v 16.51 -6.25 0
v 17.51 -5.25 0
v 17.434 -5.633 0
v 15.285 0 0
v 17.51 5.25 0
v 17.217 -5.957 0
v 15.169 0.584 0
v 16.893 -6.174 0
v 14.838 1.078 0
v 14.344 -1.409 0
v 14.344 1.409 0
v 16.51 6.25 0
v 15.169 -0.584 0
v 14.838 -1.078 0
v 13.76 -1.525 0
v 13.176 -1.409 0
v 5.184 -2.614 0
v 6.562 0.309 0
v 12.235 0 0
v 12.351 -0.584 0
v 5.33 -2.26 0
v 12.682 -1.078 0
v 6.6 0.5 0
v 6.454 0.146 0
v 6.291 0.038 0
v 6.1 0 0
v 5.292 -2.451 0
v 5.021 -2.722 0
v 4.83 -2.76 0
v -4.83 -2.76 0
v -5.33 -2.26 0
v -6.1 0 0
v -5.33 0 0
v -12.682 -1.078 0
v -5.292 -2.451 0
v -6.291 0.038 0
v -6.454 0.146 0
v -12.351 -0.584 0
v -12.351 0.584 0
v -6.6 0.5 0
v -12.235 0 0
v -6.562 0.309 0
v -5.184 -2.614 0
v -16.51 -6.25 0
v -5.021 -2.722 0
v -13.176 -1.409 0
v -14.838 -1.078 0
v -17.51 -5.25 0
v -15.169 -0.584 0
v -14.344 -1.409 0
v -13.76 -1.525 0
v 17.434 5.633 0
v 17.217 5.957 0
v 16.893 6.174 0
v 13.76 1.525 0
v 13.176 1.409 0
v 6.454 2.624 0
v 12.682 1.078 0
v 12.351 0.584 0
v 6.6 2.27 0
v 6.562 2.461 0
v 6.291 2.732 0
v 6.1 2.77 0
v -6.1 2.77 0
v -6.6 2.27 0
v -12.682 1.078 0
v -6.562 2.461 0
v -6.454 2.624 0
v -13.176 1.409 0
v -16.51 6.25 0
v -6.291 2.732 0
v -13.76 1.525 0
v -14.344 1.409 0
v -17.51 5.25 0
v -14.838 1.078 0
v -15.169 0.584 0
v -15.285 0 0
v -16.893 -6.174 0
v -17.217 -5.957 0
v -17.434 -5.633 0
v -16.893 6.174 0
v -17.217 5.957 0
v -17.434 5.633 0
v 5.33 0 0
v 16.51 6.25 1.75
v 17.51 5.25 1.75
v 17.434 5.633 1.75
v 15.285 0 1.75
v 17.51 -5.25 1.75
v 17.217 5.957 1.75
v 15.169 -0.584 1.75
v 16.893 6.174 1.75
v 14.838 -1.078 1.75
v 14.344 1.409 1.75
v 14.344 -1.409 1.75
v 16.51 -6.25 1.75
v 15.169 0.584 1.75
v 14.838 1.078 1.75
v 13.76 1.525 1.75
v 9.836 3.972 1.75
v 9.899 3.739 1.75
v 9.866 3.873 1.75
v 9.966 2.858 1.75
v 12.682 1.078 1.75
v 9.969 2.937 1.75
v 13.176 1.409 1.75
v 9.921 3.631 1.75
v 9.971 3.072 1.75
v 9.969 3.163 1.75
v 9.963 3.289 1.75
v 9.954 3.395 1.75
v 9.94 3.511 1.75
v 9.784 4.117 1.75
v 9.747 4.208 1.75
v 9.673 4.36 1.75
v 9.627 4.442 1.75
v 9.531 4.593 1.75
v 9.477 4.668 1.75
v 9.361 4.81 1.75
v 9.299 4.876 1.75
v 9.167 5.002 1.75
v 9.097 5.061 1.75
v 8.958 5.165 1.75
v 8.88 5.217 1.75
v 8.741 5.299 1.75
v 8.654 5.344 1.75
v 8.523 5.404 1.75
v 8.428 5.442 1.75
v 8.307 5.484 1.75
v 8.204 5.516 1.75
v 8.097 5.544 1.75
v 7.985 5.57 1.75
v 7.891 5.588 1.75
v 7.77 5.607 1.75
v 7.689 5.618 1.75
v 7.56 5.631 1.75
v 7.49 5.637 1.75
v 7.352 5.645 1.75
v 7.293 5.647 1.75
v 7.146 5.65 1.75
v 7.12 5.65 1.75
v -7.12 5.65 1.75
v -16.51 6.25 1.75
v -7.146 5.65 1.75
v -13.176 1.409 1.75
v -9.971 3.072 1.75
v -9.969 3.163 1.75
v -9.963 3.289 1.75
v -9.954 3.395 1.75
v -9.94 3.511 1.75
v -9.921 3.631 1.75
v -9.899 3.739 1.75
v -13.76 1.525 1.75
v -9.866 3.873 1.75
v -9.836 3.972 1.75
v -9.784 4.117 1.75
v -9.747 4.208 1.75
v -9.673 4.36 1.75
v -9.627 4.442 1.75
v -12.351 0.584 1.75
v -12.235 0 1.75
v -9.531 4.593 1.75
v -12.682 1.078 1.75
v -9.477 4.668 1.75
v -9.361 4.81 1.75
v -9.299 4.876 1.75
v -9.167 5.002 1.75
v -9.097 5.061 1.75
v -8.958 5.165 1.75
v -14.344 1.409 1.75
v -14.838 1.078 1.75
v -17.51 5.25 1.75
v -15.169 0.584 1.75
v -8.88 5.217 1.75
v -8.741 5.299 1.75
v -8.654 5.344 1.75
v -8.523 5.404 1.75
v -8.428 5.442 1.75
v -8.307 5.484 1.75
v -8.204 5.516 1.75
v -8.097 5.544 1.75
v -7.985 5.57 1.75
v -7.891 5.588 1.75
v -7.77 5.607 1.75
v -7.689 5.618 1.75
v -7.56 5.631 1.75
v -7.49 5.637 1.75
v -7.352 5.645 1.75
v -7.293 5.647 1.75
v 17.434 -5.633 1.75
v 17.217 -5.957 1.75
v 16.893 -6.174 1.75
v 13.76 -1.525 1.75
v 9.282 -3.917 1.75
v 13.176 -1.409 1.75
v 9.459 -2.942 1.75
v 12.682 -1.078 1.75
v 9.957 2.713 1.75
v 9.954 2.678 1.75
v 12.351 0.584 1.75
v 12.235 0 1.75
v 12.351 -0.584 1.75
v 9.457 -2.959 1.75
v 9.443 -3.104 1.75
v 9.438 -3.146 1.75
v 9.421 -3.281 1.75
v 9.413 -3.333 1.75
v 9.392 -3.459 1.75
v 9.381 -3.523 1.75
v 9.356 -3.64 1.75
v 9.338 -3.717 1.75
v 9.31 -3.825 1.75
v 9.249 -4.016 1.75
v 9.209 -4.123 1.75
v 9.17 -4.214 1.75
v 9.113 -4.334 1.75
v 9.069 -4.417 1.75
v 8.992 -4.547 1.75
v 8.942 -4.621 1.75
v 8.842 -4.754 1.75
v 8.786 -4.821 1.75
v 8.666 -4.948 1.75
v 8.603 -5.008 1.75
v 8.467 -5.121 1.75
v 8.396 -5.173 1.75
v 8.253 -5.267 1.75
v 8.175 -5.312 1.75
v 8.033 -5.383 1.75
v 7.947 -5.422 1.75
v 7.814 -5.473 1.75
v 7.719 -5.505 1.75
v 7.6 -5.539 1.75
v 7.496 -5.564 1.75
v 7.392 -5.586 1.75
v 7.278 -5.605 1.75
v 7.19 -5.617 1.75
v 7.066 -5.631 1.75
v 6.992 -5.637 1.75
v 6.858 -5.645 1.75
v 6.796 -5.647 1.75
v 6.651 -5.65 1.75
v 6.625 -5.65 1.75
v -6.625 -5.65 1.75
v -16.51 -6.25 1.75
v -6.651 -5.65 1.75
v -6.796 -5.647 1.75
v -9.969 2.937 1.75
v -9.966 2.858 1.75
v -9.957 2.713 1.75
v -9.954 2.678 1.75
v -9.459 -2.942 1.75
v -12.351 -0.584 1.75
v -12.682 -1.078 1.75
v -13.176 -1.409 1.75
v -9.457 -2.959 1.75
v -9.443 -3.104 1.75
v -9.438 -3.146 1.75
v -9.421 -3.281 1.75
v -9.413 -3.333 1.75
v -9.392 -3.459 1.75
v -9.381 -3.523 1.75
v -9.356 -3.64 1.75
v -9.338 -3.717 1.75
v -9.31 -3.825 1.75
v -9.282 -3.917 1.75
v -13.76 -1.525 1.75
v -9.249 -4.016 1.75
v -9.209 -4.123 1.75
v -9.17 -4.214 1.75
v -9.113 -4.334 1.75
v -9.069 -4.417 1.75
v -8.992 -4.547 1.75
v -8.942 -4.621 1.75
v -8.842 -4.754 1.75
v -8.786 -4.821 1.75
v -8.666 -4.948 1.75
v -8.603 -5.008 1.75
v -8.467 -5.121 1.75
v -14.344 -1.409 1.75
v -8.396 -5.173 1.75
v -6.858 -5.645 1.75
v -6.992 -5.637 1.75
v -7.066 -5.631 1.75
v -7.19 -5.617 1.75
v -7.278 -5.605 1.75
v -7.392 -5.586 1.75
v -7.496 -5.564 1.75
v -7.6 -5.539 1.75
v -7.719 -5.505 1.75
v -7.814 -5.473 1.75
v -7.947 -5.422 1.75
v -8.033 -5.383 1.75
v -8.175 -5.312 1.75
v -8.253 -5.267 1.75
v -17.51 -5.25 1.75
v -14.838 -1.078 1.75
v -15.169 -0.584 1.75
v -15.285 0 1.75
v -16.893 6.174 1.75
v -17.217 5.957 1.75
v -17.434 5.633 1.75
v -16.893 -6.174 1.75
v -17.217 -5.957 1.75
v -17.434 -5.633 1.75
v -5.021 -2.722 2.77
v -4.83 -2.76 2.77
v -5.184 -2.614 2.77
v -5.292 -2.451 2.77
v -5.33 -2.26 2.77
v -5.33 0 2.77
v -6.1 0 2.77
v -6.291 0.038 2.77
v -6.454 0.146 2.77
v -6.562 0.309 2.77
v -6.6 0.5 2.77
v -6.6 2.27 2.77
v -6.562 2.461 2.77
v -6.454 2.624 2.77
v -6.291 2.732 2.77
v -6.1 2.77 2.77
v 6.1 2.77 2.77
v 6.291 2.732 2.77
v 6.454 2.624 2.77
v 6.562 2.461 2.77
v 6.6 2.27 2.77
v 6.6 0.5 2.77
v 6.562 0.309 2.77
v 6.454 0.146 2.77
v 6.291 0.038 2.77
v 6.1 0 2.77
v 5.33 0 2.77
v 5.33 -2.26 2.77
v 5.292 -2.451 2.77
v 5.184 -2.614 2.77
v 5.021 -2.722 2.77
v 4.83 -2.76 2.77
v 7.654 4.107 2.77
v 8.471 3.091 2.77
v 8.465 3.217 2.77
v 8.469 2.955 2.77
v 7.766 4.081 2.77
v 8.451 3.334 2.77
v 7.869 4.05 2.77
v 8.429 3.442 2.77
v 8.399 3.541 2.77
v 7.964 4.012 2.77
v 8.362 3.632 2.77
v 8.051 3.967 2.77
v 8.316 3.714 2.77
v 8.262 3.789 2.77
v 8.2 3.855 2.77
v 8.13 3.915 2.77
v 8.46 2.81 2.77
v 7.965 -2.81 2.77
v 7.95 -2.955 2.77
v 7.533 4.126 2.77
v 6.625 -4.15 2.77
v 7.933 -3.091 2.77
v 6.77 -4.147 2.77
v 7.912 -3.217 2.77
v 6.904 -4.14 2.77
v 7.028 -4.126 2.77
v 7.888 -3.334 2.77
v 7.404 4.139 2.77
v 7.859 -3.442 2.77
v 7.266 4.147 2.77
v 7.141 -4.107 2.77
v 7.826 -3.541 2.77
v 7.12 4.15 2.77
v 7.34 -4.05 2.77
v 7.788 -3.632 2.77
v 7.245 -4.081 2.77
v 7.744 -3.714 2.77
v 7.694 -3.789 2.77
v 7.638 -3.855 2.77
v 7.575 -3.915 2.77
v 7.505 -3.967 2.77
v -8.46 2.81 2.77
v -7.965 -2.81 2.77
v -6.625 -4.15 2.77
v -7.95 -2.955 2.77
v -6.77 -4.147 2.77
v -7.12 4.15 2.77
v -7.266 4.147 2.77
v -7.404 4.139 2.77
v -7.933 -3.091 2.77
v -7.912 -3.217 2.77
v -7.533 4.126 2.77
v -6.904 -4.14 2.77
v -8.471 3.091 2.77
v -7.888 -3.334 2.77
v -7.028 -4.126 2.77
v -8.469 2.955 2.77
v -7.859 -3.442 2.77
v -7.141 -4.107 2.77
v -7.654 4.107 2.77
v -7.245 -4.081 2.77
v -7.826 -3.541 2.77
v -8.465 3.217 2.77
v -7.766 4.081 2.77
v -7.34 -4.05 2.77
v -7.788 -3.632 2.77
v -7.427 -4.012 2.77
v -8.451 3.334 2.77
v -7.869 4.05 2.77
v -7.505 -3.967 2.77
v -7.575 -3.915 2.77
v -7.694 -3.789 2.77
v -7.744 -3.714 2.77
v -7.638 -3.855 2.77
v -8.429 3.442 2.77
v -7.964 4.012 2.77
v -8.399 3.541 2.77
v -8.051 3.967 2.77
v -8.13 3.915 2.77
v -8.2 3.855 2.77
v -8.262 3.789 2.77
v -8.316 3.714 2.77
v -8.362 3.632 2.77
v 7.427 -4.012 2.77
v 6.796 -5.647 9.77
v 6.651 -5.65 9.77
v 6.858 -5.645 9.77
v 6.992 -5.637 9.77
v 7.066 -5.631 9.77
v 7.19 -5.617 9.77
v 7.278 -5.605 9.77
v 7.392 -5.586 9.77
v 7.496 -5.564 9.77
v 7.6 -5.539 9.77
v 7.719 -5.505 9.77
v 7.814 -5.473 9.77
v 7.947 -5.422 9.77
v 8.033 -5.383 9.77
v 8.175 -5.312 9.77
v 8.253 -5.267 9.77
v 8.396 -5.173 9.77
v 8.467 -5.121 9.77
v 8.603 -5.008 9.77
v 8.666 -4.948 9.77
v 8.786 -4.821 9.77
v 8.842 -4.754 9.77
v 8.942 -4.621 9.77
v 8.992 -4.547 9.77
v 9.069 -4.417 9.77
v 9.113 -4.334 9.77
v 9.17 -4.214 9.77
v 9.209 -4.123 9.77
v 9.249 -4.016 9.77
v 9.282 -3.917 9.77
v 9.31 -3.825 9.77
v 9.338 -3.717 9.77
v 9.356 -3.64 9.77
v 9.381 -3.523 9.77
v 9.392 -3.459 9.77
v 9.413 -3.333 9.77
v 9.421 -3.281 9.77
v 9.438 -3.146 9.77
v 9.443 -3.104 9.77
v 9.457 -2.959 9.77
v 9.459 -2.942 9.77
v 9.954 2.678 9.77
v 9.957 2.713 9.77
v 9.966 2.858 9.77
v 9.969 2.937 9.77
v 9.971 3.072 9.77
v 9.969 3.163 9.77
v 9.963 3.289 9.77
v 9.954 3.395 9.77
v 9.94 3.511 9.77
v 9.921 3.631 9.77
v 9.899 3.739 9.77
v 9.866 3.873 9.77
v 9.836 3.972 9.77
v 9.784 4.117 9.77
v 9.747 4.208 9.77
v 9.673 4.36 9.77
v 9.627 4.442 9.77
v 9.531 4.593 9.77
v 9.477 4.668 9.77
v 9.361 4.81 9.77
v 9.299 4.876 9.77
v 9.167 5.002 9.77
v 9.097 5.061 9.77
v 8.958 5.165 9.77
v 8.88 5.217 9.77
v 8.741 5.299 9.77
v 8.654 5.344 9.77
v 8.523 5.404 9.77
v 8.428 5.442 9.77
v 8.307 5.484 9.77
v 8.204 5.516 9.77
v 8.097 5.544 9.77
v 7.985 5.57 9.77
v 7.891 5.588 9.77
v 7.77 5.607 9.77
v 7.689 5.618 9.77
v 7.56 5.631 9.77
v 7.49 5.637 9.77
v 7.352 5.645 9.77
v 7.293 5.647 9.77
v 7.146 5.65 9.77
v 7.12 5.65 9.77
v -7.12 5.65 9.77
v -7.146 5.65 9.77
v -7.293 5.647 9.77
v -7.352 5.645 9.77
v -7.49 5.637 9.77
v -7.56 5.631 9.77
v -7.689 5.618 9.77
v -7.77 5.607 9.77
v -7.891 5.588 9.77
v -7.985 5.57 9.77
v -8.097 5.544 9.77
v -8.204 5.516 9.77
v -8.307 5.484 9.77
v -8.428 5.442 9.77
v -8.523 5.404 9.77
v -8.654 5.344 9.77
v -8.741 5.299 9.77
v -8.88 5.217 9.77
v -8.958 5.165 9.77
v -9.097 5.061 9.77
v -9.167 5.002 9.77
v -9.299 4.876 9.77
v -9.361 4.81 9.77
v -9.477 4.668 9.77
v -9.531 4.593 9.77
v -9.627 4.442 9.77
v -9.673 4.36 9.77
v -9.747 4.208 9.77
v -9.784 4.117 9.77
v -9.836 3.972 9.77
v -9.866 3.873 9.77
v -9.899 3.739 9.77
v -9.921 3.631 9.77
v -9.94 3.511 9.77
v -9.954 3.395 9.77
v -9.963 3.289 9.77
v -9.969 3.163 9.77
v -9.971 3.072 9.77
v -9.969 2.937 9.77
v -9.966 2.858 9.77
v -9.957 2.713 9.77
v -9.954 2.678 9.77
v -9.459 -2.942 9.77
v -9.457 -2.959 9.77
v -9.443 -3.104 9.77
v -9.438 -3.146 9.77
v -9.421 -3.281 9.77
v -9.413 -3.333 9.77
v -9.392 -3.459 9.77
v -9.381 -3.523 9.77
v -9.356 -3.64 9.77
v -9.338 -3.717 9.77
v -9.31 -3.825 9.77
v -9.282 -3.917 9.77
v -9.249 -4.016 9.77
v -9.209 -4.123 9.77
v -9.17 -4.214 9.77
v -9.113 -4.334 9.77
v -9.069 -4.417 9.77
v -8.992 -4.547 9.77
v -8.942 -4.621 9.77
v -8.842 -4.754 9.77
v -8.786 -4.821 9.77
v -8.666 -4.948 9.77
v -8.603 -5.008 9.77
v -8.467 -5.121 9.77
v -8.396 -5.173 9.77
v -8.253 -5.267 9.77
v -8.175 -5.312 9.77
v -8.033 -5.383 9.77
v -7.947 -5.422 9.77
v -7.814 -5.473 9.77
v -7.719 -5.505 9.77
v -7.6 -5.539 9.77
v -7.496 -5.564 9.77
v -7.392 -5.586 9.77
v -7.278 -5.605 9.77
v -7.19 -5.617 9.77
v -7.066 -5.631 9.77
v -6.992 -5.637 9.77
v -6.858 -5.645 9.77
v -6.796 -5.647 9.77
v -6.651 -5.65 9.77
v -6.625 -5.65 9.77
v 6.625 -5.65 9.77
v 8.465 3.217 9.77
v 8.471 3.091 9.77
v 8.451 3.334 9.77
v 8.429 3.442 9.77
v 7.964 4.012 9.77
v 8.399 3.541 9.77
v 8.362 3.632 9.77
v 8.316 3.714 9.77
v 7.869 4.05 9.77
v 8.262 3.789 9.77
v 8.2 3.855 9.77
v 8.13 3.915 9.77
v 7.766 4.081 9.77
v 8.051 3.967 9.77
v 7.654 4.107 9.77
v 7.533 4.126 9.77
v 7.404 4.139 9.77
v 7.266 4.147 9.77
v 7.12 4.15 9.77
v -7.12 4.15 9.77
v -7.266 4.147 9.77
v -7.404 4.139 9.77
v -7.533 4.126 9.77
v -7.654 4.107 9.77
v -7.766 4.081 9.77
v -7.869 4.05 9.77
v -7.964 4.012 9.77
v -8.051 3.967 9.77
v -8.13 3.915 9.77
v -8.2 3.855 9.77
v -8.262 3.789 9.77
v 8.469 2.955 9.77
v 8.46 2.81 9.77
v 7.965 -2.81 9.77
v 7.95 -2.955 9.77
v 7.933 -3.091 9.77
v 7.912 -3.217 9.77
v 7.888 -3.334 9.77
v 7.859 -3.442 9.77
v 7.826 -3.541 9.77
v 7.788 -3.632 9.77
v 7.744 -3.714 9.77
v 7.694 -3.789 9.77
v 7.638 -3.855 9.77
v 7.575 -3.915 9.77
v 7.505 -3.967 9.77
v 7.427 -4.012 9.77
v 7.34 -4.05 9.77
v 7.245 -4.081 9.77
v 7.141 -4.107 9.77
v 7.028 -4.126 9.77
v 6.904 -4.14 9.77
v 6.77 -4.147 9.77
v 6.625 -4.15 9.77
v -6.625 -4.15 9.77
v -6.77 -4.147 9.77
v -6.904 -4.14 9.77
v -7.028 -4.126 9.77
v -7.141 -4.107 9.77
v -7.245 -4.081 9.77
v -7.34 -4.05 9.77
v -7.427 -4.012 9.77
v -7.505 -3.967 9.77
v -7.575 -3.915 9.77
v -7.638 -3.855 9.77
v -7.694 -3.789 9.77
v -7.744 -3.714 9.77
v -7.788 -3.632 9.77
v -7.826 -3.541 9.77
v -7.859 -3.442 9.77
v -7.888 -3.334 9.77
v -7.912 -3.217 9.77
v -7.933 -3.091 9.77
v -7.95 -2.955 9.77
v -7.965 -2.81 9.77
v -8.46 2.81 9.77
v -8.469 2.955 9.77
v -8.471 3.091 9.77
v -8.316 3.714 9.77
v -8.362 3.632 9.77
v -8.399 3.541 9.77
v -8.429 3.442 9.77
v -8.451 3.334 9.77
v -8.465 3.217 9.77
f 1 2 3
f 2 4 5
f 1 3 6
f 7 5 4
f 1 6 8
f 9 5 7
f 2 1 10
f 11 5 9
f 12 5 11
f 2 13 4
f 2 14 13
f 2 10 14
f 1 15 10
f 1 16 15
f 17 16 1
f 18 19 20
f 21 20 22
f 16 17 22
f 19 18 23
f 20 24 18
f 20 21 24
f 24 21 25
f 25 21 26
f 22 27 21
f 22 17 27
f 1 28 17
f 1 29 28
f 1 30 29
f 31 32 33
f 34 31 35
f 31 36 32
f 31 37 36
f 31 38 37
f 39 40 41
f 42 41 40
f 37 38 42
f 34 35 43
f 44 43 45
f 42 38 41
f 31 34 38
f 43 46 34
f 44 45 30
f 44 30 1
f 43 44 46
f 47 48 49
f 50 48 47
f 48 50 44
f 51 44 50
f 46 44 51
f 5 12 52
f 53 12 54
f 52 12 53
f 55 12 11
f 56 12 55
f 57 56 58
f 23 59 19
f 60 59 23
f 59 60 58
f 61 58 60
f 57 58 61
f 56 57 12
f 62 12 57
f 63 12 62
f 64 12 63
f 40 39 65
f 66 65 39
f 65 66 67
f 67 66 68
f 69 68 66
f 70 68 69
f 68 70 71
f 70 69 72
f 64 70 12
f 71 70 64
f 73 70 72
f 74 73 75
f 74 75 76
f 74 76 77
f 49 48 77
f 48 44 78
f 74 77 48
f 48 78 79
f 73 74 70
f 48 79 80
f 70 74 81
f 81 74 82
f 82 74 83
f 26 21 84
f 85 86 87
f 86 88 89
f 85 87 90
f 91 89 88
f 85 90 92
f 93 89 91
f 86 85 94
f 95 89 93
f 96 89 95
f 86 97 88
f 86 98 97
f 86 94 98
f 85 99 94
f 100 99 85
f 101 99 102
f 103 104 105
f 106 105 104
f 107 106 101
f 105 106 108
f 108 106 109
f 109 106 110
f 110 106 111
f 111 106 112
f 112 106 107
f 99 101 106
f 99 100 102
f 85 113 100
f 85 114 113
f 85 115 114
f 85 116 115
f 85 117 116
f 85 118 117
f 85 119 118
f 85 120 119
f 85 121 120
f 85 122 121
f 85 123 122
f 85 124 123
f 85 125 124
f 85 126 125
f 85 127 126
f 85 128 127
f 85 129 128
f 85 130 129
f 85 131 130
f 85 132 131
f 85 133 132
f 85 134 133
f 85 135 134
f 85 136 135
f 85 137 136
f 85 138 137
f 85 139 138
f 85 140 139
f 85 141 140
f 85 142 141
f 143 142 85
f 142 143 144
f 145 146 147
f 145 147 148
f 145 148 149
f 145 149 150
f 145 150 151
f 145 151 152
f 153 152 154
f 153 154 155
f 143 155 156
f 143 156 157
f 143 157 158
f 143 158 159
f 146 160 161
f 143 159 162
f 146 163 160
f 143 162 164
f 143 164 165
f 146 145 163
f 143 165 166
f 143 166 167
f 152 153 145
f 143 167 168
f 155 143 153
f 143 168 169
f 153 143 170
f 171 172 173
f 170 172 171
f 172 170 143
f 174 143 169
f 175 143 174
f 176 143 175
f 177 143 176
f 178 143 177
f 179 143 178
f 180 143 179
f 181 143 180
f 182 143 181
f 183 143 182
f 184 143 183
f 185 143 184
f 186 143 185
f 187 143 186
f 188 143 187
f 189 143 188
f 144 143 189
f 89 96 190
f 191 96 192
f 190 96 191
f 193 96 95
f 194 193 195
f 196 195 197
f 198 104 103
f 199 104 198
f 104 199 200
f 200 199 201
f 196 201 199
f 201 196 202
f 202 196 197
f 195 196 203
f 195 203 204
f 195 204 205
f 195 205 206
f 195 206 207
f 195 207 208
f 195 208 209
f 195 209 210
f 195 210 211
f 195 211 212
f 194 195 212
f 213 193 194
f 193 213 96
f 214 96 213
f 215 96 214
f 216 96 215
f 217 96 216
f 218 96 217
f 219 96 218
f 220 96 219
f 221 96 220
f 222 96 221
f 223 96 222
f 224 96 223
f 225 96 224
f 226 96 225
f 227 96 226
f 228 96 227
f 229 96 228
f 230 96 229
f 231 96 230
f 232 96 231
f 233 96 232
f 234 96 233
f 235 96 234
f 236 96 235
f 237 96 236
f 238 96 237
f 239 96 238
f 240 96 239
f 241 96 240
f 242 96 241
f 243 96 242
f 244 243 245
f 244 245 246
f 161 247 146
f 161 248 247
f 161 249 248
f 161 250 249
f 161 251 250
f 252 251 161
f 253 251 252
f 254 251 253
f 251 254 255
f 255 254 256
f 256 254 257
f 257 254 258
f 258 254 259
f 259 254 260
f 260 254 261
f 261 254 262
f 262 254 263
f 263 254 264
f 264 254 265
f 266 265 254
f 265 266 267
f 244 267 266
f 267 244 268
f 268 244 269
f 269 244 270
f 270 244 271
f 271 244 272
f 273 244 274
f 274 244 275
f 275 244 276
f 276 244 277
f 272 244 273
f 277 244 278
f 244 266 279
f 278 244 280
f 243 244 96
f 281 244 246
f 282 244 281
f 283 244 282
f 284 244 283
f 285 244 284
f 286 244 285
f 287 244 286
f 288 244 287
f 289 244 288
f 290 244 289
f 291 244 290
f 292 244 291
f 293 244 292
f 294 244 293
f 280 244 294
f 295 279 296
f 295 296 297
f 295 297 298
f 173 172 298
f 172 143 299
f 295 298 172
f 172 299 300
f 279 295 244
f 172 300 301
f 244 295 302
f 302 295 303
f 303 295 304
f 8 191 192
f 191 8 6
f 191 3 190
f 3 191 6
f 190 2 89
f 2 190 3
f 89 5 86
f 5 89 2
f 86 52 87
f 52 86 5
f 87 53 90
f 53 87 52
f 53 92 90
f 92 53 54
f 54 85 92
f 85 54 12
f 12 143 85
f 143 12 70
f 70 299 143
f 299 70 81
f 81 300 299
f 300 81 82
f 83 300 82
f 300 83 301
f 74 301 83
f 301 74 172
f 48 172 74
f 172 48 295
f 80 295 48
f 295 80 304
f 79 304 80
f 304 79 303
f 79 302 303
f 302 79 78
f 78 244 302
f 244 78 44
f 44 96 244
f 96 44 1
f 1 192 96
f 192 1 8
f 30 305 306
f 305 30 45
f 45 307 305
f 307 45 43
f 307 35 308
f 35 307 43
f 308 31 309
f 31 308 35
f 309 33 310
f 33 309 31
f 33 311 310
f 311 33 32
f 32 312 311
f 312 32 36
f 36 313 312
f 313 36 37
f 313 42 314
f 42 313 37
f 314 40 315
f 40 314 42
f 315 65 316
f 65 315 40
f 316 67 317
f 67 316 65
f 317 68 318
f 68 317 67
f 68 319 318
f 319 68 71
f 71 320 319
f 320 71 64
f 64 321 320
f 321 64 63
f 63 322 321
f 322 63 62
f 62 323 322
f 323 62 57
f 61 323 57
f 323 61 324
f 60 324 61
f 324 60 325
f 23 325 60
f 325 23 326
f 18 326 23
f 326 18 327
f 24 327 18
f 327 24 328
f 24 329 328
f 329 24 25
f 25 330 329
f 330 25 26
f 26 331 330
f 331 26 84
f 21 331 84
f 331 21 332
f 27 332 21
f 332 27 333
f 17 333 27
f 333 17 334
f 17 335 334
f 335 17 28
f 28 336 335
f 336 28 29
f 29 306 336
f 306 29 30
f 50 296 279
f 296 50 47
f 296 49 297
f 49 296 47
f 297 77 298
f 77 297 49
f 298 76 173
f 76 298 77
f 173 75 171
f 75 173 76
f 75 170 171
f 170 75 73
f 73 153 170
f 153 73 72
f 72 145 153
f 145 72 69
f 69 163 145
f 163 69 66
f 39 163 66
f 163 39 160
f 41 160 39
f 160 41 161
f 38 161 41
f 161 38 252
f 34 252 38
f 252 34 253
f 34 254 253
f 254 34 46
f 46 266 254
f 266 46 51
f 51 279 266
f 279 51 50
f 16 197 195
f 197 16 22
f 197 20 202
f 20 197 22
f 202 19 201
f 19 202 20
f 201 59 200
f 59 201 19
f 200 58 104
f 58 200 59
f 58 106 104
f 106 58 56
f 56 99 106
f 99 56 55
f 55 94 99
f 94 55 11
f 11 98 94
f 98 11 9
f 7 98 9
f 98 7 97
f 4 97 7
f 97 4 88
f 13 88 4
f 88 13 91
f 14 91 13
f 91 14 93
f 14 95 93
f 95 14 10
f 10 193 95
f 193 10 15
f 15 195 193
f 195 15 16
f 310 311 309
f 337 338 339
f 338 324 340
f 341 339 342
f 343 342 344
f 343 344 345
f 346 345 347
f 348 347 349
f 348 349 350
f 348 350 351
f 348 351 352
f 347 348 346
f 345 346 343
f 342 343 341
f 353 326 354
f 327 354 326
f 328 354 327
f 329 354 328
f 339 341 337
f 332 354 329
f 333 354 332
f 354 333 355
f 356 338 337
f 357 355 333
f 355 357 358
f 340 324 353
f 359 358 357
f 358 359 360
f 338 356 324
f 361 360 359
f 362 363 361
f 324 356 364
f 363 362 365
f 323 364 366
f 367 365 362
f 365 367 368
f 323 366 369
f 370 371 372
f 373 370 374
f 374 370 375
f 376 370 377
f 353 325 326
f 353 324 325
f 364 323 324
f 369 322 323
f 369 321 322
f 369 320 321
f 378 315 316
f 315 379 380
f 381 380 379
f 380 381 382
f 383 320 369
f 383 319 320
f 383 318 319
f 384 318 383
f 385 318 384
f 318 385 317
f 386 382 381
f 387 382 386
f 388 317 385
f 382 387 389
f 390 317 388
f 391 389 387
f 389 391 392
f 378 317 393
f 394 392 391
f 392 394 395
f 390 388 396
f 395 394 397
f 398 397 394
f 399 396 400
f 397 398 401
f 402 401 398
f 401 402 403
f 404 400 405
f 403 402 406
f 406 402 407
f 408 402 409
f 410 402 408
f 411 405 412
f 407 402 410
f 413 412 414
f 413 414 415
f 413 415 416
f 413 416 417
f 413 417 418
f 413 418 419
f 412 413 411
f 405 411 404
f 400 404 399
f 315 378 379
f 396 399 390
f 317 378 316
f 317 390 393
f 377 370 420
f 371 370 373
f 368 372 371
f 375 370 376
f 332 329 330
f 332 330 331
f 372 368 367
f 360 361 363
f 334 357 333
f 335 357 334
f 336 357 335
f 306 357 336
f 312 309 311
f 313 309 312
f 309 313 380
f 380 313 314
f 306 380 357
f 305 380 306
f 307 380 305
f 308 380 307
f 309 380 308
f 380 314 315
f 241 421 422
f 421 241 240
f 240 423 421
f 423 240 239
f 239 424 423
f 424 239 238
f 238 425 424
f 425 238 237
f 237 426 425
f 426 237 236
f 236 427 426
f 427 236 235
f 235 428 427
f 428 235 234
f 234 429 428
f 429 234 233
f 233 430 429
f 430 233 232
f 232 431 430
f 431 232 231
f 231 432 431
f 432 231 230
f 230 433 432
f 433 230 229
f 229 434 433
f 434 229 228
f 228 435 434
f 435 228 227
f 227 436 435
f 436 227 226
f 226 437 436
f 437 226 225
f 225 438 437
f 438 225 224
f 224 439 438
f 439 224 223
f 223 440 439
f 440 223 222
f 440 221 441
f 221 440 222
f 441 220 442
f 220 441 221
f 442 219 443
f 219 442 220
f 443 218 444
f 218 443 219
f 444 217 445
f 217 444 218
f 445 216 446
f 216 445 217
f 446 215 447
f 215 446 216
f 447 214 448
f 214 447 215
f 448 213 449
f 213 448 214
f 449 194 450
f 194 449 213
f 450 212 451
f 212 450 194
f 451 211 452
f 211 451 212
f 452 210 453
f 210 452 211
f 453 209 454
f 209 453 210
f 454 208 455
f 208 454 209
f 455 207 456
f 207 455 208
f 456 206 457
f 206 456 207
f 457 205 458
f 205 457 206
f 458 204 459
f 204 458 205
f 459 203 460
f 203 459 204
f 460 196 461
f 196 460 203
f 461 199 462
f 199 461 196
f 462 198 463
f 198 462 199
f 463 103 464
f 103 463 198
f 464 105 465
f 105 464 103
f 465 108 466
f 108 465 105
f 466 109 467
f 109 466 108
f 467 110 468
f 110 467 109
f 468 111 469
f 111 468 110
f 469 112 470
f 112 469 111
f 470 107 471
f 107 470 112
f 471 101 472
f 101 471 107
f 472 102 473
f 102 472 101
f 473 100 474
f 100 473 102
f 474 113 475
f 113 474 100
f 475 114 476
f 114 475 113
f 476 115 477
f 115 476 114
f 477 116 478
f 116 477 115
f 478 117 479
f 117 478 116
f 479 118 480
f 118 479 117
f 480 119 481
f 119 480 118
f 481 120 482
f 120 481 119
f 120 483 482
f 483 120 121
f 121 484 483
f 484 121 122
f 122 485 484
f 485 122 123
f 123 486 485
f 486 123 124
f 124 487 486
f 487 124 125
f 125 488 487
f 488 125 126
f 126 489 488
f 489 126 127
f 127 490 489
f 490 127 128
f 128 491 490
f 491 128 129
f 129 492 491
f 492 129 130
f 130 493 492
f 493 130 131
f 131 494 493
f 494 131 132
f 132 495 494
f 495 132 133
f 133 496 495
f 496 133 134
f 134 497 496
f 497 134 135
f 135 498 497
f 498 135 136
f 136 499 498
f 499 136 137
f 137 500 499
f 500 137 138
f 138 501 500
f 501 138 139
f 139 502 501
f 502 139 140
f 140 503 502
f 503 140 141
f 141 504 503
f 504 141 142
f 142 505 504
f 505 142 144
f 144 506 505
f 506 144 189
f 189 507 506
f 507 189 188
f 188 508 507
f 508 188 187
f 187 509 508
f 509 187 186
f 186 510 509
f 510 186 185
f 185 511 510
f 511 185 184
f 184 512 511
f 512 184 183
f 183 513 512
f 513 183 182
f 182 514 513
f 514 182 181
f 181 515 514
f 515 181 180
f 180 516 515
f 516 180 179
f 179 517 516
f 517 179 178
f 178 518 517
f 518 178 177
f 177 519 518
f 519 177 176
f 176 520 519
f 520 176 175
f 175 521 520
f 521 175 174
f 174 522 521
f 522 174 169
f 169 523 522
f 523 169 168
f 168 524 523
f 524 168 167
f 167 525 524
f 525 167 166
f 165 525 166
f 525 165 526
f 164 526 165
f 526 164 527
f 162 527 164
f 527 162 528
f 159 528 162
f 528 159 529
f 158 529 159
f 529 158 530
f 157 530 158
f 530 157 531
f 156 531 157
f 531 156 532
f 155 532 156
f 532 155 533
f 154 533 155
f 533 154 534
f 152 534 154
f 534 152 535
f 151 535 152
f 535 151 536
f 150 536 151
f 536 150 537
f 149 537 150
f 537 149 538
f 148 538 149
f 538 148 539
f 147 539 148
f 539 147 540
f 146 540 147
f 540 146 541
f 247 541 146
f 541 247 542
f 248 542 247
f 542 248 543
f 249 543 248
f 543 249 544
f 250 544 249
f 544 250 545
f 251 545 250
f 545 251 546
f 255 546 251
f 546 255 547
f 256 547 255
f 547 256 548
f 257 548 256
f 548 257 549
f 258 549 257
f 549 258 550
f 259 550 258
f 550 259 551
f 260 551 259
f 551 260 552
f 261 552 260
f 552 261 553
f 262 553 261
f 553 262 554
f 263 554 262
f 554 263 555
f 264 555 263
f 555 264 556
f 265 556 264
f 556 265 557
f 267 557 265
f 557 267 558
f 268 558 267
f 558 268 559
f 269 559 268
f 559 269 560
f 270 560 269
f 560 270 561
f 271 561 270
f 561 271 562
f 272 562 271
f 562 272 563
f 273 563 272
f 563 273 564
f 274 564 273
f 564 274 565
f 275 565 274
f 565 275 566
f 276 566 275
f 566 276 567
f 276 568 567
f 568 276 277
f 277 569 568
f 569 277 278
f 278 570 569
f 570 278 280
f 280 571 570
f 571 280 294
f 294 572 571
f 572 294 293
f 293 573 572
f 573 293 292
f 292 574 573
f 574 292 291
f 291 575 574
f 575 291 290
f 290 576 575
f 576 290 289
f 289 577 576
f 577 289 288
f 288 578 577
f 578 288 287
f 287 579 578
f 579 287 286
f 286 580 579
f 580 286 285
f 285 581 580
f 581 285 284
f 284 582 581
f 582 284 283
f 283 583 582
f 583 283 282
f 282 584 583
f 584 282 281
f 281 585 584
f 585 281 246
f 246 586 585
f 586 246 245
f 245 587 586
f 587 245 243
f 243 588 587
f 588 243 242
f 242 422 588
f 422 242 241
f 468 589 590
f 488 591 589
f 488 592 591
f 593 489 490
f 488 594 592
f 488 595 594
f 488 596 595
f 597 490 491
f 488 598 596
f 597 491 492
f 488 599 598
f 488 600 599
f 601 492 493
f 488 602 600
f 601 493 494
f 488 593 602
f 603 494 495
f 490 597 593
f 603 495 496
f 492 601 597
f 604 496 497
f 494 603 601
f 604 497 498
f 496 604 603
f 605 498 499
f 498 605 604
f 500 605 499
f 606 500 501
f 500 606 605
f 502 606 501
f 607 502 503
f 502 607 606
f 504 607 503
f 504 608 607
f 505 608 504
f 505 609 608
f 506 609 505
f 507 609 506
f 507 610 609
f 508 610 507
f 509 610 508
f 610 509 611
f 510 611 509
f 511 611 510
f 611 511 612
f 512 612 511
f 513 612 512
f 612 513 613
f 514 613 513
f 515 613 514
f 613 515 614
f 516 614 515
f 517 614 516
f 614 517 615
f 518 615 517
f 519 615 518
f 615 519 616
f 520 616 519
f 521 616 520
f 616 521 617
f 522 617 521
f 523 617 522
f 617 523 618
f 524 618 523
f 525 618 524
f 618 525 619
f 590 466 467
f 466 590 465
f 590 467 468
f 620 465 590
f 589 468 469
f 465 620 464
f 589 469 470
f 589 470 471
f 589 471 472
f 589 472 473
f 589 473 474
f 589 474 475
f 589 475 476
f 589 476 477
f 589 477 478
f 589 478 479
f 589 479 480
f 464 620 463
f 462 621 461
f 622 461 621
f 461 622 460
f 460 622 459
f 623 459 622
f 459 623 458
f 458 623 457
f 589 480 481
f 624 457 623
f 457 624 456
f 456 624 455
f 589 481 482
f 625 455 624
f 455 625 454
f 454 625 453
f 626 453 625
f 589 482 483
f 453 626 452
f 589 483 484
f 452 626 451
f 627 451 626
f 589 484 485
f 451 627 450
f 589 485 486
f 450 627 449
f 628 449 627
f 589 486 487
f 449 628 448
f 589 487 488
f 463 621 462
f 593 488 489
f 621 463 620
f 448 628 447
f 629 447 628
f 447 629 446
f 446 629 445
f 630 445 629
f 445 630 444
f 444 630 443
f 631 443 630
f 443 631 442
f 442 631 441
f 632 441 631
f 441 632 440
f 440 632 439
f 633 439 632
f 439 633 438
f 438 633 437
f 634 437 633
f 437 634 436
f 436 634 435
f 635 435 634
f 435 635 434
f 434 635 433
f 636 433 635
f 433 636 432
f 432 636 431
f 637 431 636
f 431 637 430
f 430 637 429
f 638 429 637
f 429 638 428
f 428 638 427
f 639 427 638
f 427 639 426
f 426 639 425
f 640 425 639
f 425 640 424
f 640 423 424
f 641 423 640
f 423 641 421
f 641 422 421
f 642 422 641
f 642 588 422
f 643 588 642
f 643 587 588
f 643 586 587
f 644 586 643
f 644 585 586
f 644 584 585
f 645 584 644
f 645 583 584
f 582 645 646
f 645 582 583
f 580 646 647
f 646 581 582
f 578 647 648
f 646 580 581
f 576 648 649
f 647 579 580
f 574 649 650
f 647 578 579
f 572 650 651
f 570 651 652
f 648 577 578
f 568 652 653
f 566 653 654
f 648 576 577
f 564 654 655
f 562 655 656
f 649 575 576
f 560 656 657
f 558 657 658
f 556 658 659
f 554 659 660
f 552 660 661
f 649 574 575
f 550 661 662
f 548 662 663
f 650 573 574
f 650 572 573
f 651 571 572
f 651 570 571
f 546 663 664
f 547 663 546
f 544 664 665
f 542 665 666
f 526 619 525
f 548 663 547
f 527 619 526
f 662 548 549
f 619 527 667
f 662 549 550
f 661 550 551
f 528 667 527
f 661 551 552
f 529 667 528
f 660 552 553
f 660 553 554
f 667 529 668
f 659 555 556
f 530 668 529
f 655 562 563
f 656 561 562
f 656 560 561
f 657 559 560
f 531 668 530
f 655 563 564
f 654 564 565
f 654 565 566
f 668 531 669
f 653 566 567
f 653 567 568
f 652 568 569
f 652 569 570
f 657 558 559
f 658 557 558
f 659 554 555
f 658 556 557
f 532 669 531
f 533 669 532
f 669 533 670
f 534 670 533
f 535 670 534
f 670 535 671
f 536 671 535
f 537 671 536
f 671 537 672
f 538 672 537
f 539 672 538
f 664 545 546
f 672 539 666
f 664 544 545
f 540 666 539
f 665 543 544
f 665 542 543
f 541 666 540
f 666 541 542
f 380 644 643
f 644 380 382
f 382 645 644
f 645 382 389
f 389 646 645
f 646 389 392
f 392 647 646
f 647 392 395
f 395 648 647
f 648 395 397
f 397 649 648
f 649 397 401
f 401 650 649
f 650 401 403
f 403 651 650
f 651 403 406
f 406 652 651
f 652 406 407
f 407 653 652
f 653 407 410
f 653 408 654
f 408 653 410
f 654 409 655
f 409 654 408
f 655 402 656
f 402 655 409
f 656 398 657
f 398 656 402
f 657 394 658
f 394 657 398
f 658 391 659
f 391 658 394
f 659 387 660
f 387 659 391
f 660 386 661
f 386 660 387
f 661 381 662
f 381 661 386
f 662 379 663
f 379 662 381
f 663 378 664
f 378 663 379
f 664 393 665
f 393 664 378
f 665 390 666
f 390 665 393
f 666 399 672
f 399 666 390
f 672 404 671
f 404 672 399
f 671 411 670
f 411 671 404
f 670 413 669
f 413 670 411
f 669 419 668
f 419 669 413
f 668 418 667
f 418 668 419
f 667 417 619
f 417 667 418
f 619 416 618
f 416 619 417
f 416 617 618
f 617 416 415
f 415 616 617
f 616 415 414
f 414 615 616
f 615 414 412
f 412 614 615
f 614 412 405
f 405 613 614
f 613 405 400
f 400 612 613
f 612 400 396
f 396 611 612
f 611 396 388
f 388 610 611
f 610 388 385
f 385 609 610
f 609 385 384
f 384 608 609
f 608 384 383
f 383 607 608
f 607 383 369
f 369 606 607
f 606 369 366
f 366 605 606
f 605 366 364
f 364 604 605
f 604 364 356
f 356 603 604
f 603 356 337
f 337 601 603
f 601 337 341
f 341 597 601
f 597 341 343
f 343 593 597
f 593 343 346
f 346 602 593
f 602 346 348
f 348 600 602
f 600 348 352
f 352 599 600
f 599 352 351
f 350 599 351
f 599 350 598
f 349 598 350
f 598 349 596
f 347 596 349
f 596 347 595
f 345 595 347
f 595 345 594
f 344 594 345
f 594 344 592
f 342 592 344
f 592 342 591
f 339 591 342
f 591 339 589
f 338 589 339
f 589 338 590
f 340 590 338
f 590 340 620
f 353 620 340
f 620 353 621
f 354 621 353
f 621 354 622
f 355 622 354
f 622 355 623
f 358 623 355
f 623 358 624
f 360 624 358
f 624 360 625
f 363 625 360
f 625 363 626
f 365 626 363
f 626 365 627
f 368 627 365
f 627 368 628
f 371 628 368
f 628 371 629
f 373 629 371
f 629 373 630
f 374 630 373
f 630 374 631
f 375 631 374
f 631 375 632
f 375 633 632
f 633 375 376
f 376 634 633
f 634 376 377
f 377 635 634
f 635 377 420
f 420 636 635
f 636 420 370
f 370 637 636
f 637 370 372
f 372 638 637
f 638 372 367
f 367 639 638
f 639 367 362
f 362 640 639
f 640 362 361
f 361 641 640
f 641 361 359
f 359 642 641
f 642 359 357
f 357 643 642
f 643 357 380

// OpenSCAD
pins = 9;
stripsTolerance = 0.25;
socketWall = 1.5;
socketDepth = 7;
mountThickness = 1.75;
// the jack is the female part that fits inside the socket
jackHeight = 8.3;
jackWidthIncrementBeyondNominalPinSpacing = 3.12;
// official value for db9 is 10.7, but that's not so good for our thicker plastic wall
mountHeight = 12.5;
// official value for db9 is 3.04, but I like 3.75
mountEdgeDistanceBeyondScrews = 3.75;
// official distance for db9 is 4.04, but I like 5.3
screwDistanceFromJack = 5.3;
socketScrewHole = 3.05;

slantAngle = 10;
offset = 1.34;
rounding = 0.75;
stripsHeight = 2.51;
// this is what it should be
nominalPinSpacing = 2.76;
// this is what it is if you use 0.1" header
headerPinSpacing = 2.54;
stripsSpacerDepth = 2.77;
// this might be useful to put down an extra layer of plastic at the bottom to help the header pins stick in place
stripsExtraDepth = 0;
pinHoleDiameter = 0.4;

module end_of_parameters_dummy() {}


//BEGIN: use <bezier.scad>;
/*
Copyright (c) 2017 Alexander R. Pruss.

Licensed under any Creative Commons Attribution license you like or under the
following MIT License.

Permission is hereby granted, free of charge, to any person obtaining a copy
of this software and associated documentation files (the "Software"), to deal
in the Software without restriction, including without limitation the rights
to use, copy, modify, merge, publish, distribute, sublicense, and/or sell
copies of the Software, and to permit persons to whom the Software is
furnished to do so, subject to the following conditions:

The above copyright notice and this permission notice shall be included in all
copies or substantial portions of the Software.

THE SOFTWARE IS PROVIDED "AS IS", WITHOUT WARRANTY OF ANY KIND, EXPRESS OR
IMPLIED, INCLUDING BUT NOT LIMITED TO THE WARRANTIES OF MERCHANTABILITY,
FITNESS FOR A PARTICULAR PURPOSE AND NONINFRINGEMENT. IN NO EVENT SHALL THE
AUTHORS OR COPYRIGHT HOLDERS BE LIABLE FOR ANY CLAIM, DAMAGES OR OTHER
LIABILITY, WHETHER IN AN ACTION OF CONTRACT, TORT OR OTHERWISE, ARISING FROM,
OUT OF OR IN CONNECTION WITH THE SOFTWARE OR THE USE OR OTHER DEALINGS IN THE
SOFTWARE.

*/


// Public domain Bezier stuff from www.thingiverse.com/thing:8443
function BEZ03(u) = pow(1-u, 3);
function BEZ13(u) = 3*u*pow(1-u,2);
function BEZ23(u) = 3*pow(u,2)*(1-u);
function BEZ33(u) = pow(u,3);
function PointAlongBez4(p0, p1, p2, p3, u) =
	BEZ03(u)*p0+BEZ13(u)*p1+BEZ23(u)*p2+BEZ33(u)*p3;
// End public domain Bezier stuff
function d2BEZ03(u) = 6*(1-u);
function d2BEZ13(u) = 18*u-12;
function d2BEZ23(u) = -18*u+6;
function d2BEZ33(u) = 6*u;

function worstCase2ndDerivative(p0, p1, p2, p3, u1, u2)
    = norm([
        for(i=[0:len(p0)-1])
            max([for(u=[u1,u2])
                d2BEZ03(u)*p0[i]+d2BEZ13(u)*p1[i]+
                d2BEZ23(u)*p2[i]+d2BEZ33(u)*p3[i]]) ]);

function neededIntervalLength(p0,p1,p2,p3,u1,u2,tolerance)
    = let(d2=worstCase2ndDerivative(p0,p1,p2,p3,u1,u2))
        d2==0 ? u2-u1+1 : sqrt(2*tolerance/d2);

function REPEAT_MIRRORED(v,angleStart=0,angleEnd=360) = ["m",v,angleStart,angleEnd];
function SMOOTH_REL(x) = ["r",x];
function SMOOTH_ABS(x) = ["a",x];
function SYMMETRIC() = ["r",1];
function OFFSET(v) = ["o",v];
function SHARP() = OFFSET([0,0,0]);
function LINE() = ["l",0];
function POLAR(r,angle) = OFFSET(r*[cos(angle),sin(angle)]);
//function POINT_IS_SPECIAL(v) = (v[0]=="r" || v[0]=="a" || v[0]=="o" || v[0]=="l");

// this does NOT handle offset type points; to handle those, use DecodeBezierOffsets()
function getControlPoint(cp,node,otherCP,otherNode,nextNode) =
    let(v=node-otherCP) (
    cp[0]=="r" ? node+cp[1]*v:
    cp[0]=="a" ? (
        norm(v)<1e-9 ? node+cp[1]*(node-otherNode)/norm(node-otherNode) : node+cp[1]*v/norm(v) ) :
        cp );

function onLine2(a,b,c,eps=1e-4) =
    norm(c-a) <= eps ? true
        : norm(b-a) <= eps ? false /* to be safe */
            : abs((c[1]-a[1])*(b[0]-a[0]) - (b[1]-a[1])*(c[0]-a[0])) <= eps * eps && norm(c-a) <= eps + norm(b-a);

function isStraight2(p1,c1,c2,p2,eps=1e-4) =
    len(p1) == 2 &&
    onLine2(p1,p2,c1,eps=eps) && onLine2(p2,p1,c2,eps=eps);

function Bezier2(p,index=0,precision=0.05,rightEndPoint=true,optimize=true) = let(nPoints=
        max(1, precision < 0 ?
                    ceil(1/
                        neededIntervalLength(p[index],p[index+1],p[index+2],p[index+3],0,1,-precision))
                    : ceil(1/precision)) )
    optimize && isStraight2(p[index],p[index+1],p[index+2],p[index+3]) ? (rightEndPoint?[p[index+0],p[index+3]]:[p[index+0]] ) :
    [for (i=[0:nPoints-(rightEndPoint?0:1)]) PointAlongBez4(p[index+0],p[index+1],p[index+2],p[index+3],i/nPoints)];

function flatten(listOfLists) = [ for(list = listOfLists) for(item = list) item ];


// p is a list of points, in the format:
// [node1,control1,control2,node2,control3, control4,node3, ...]
// You can replace inner control points with:
//   SYMMETRIC: uses a reflection of the control point on the other side of the node
//   SMOOTH_REL(x): like SYMMETRIC, but the distance of the control point to the node is x times the distance of the other control point to the node
//   SMOOTH_ABS(x): like SYMMETRIC, but the distance of the control point to the node is exactly x
// You can also replace any control point with:
//   OFFSET(v): puts the control point at the corresponding node plus the vector v
//   SHARP(): equivalent to OFFSET([0,0])
//   LINE(): when used for both control points between two nodes, generates a straight line
//   POLAR(r,angle): like OFFSET, except the offset is specified in polar coordinates

function DecodeBezierOffset(control,node) = control[0] == "o" ? node+control[1] : control;

function _mirrorMatrix(normalVector) = let(v = normalVector/norm(normalVector)) len(v)<3 ? [[1-2*v[0]*v[0],-2*v[0]*v[1]],[-2*v[0]*v[1],1-2*v[1]*v[1]]] : [[1-2*v[0]*v[0],-2*v[0]*v[1],-2*v[0]*v[2]],[-2*v[0]*v[1],1-2*v[1]*v[1],-2*v[1]*v[2]],[-2*v[0]*v[2],-2*v[1]*v[2],1-2*v[2]*v[2]]];

function _correctLength(p,start=0) =
    start >= len(p) || p[start][0] == "m" ? 3*floor(start/3)+1 : _correctLength(p,start=start+1);

function _trimArray(a, n) = [for (i=[0:n-1]) a[i]];

function _transformPoint(matrix,a) =
    let(n=len(a))
        len(matrix[0])==n+1 ?
            _trimArray(matrix * concat(a,[1]), n)
            : matrix * a;

function _transformPath(matrix,path) =
    [for (a=path) _transformPoint(matrix,a)];

function _reverseArray(array) = let(n=len(array)) [for (i=[0:n-1]) array[n-1-i]];

function _stitchPaths(a,b) = let(na=len(a)) [for (i=[0:na+len(b)-2]) i<na? a[i] : b[i-na+1]-b[0]+a[na-1]];

// replace all OFFSET/SHARP/POLAR points with coordinates
function DecodeBezierOffsets(p) = [for (i=[0:_correctLength(p)-1]) i%3==0?p[i]:(i%3==1?DecodeBezierOffset(p[i],p[i-1]):DecodeBezierOffset(p[i],p[i+1]))];

function _mirrorPaths(basePath, control, start) =
    control[start][0] == "m" ? _mirrorPaths(_stitchPaths(basePath,_reverseArray(_transformPath(_mirrorMatrix( control[start][1] ),basePath))), control, start+1) : basePath;

function DecodeMirrored(path,start=0) =
    start >= len(path) ? path :
    path[start][0] == "m" ? _mirrorPaths([for(i=[0:1:start-1]) path[i]], path, start) :
        DecodeMirrored(path,start=start+1);

function DecodeLines(p) = [for (i=[0:len(p)-1])
    i%3==0 || p[i][0] != "l" ? p[i] :
    i%3 == 1 ? (p[i-1]*2+p[i+2])/3 :
    (p[i-2]+p[i+1]*2)/3 ];

function DecodeSpecialBezierPoints(p0) =
    let(
        l = _correctLength(p0),
        doMirror = len(p0)>l && p0[l][0] == "m",
        p1=DecodeLines(p0),
        p=DecodeBezierOffsets(p1),
        basePath = [for (i=[0:l-1]) i%3==0?p[i]:(i%3==1?getControlPoint(p[i],p[i-1],p[i-2],p[i-4],p[i+2]):getControlPoint(p[i],p[i+1],p[i+2],p[i+4],p[i-2]))])
        doMirror ? _mirrorPaths(basePath, p0, l) : basePath;

function Distance2D(a,b) = sqrt((a[0]-b[0])*(a[0]-b[0])+(a[1]-b[1])*(a[1]-b[1]));

function RemoveDuplicates(p,eps=0.00001) = let(safeEps = eps/len(p)) [for (i=[0:len(p)-1]) if(i==0 || i==len(p)-1 || Distance2D(p[i-1],p[i]) >= safeEps) p[i]];

function Bezier(p,precision=0.05,eps=0.00001,optimize=true) = let(q=DecodeSpecialBezierPoints(p), nodes=(len(q)-1)/3) RemoveDuplicates(flatten([for (i=[0:nodes-1]) Bezier2(q,optimize=optimize,index=i*3,precision=precision,rightEndPoint=(i==nodes-1))]),eps=eps);

function GetSplineAngle(a,b,c) =
    a==c && b==a ? 0 :
    a==c ? let(ba=b-a) atan2(ba[1],ba[0]) :
    let(ca=c-a) atan2(ca[1],ca[0]);

/*    let(ba=norm(b-a),cb=norm(c-b))
        ba == 0 && cb == 0 ? 0 :
    let(v = ba == 0 ? c-b :
            cb == 0 ? b-a :
            (c-b)*norm(b-a)/norm(c-b)+(b-a))
    atan2(v[1],v[0]); */

// do a spline around b
function SplineAroundPoint(a,b,c,tension=0.5,includeLeftCP=true,includeRightCP=true) =
    includeLeftCP && includeRightCP ?
        [POLAR(tension*norm(a-b),GetSplineAngle(c,b,a)),b,POLAR(tension*norm(c-b),GetSplineAngle(a,b,c))] :
    includeLeftCP ?
        [POLAR(tension*norm(a-b),GetSplineAngle(c,b,a)),b] :
    includeRightCP ?
        [b,POLAR(tension*norm(c-b),GetSplineAngle(a,b,c))] :
        [b];

function mod(n,m) = let(q=n%m) q>=0 ? q : m+q;

function _unit(v) = norm(v)==0 ? [for(x=v) 0] : v/norm(v);

function _corner(p0,p1,p2,offset=2,tension=0.448084975506) =
    [p1-_unit(p1-p0)*offset,
    p1-_unit(p1-p0)*offset*(1-tension),
    p1-_unit(p1-p2)*offset*(1-tension),
    p1-_unit(p1-p2)*offset,
    LINE(),LINE()];

function _roundPathRaw(path,start,end,offset=2,tension=0.551915024494) =
    let(n=len(path),
        p2=_mirrorPaths(path))
        [for(p=[for(i=[start:1:end-1]) _corner(p2[mod(i-1,n)],p2[i],path[mod(i+1,n)],offset=offset,tension=tension)]) for(q=p) q];

function PathToBezier(path,offset=2,tension=0.551915024494,closed=false) =
    let(p1=DecodeMirrored(path),
        n=len(p1))
        offset==0 && tension==0 ?
        p1 :
        !closed ? concat([p1[0],LINE(),LINE()], _roundPathRaw(p1,1,n-1,offset=offset,tension=tension), [p1[n-1]]) :
        let(p2 = _roundPathRaw(p1,0,n,offset=offset,tension=tension),
            n2 = len(p2))
        [for(i=[0:1:n2-3]) p2[mod(i,n2)]];
function BezierSmoothPoints(points,tension=0.5,closed=false)
    = let (n=len(points))
        flatten(
        closed ? [ for (i=[0:n]) SplineAroundPoint(points[(n+i-1)%n],points[i%n],points[(i+1)%n],tension=tension,includeLeftCP=i>0,includeRightCP=i<n) ] :
        [ for (i=[0:n-1])
            SplineAroundPoint(
            i==0 ? 2*points[0]-points[1] : points[(n+i-1)%n],
            points[i],
            i==n-1 ? 2*points[n-1]-points[n-2] : points[(i+1)%n],tension=tension,includeLeftCP=i>0,includeRightCP=i<n-1  ) ]);

module BezierVisualize(p,precision=0.05,eps=0.00001,lineThickness=0.25,controlLineThickness=0.125,nodeSize=1) {
    $fn = 16;
    dim = len(p[0]);
    module point(size) {
        if (dim==2)
            circle(d=size);
        else
            sphere(d=size);
    }
    p1 = DecodeSpecialBezierPoints(p);
    l = Bezier(p1,precision=precision,eps=eps);
    for (i=[0:len(l)-2]) {
        hull() {
            translate(l[i]) point(lineThickness);
            translate(l[i+1]) point(lineThickness);
        }
    }
    for (i=[0:len(p1)-1]) {
        if (i%3 == 0) {
            color("black") translate(p1[i]) point(nodeSize);
        }
        else {
            node = i%3 == 1 ? i-1 : i+1;
            color("red") translate(p1[i]) point(nodeSize);
            color("red") hull() {
                translate(p1[node]) point(controlLineThickness);
                translate(p1[i]) point(controlLineThickness);
            }
        }
    }
}


//END: use <bezier.scad>;


//BEGIN: use <roundedSquare.scad>;
module roundedSquare(size=[10,10], radius=1, center=false, $fn=16) {
    size1 = (size+0==size) ? [size,size] : size;
    if (radius <= 0) {
        square(size1, center=center);
    }
    else {
        translate(center ? -size1/2 : [0,0])
        hull() {
            translate([radius,radius]) circle(r=radius);
            translate([size1[0]-radius,radius]) circle(r=radius);
            translate([size1[0]-radius,size1[1]-radius]) circle(r=radius);
            translate([radius,size1[1]-radius]) circle(r=radius);
        }
    }
}

module roundedCube(size=[10,10,10], radius=1, center=false, $fn=16) {
    linear_extrude(height=size[2])
    roundedSquare(size=[size[0],size[1]], radius=radius, center=center);
}

module roundedOpenTopBox(size=[10,10,10], radius=2, wall=1, solid=false) {
    render(convexity=2)
    difference() {
        linear_extrude(height=size[2]) roundedSquare(size=[size[0],size[1]], radius=radius);
        if (!solid) {
            translate([0,0,wall])
            linear_extrude(height=size[2]-wall)
            translate([wall,wall]) roundedSquare(size=[size[0]-2*wall,size[1]-2*wall], radius=radius-wall);
        }
    }
}

//END: use <roundedSquare.scad>;



module dummy(){}

stripsDepth = stripsSpacerDepth + stripsExtraDepth;
pinsInRow2 = pins%2 ? (pins+1)/2 : pins/2;
pinsInRow1 = pins%2 ? (pins-1)/2 : pins/2;
jackWidth = pinsInRow2*nominalPinSpacing+jackWidthIncrementBeyondNominalPinSpacing;

pinSpacing = headerPinSpacing;
screwSpacing = jackWidth+ 2 * screwDistanceFromJack;

mountWidth = screwSpacing + 2*mountEdgeDistanceBeyondScrews;
height = jackHeight;
width2 = jackWidth;
width1 = width2-tan(slantAngle)*(height-2*offset);

stripsWidth2 = pinSpacing * pinsInRow2;
stripsWidth1 = pinSpacing * pinsInRow1;
nudge = 0.01;

function roundedTrapezoidPath(width1,width2,height) =
    let(path = [ [0,0], LINE(), LINE(),
         [width1/2-offset,0], SMOOTH_ABS(offset*rounding), SMOOTH_ABS(offset*rounding),
         [width1/2,offset], LINE(), LINE(),
         [width2/2,height-offset], SMOOTH_ABS(offset*rounding), SMOOTH_ABS(offset*rounding),
         [width2/2-offset,height], LINE(), LINE(), [0,height], REPEAT_MIRRORED([10,0])])
    Bezier(path);

module roundedTrapezoid(width1,width2,height) {
    translate([0,-height/2])
    polygon(roundedTrapezoidPath(width1,width2,height));
}

module innerInside() {
    w1 = stripsWidth1+2*stripsTolerance;
    w2 = stripsWidth2+2*stripsTolerance;
    h = stripsHeight+stripsTolerance;
    translate([-w1/2,-h]) roundedSquare([w1,h+nudge+0.5],radius=0.5);
    translate([-w2/2,0]) roundedSquare([w2,h+nudge],radius=0.5);
}

module outerSocket() {
    offset(r=socketWall) roundedTrapezoid(width1,width2,height);
}

function outerSocketHeight() =
    let(path=roundedTrapezoidPath(width1,width2,height))
    2*socketWall + max([for(p=path) p[1]])-min([for(p=path) p[1]]);

linear_extrude(height=mountThickness)
difference() {
    roundedSquare([mountWidth,mountHeight],center=true,radius=1);
    innerInside();
    for (i=[-1,1]) translate([i*(screwSpacing/2),0]) circle($fn=16,d=socketScrewHole);
}

function getMountHeight() = mountHeight;

linear_extrude(height=stripsDepth)
difference() {
    outerSocket();
    innerInside();
}

linear_extrude(height=stripsDepth+socketDepth)
difference() {
    outerSocket();
    roundedTrapezoid(width1,width2,height);
}

if (stripsExtraDepth>0)
    linear_extrude(height=stripsExtraDepth) difference() {
        outerSocket();
        for (i=[0,1]) {
            pins = [pinsInRow1,pinsInRow2][i];
            translate([-pins/2*headerPinSpacing+0.5*headerPinSpacing,stripsHeight*(i-0.5)]) {
                for(j=[0:pins-1]) {
                    translate([headerPinSpacing*j,0]) circle(d=pinHoleDiameter,$fn=18);
                }
            }
        }
    }
